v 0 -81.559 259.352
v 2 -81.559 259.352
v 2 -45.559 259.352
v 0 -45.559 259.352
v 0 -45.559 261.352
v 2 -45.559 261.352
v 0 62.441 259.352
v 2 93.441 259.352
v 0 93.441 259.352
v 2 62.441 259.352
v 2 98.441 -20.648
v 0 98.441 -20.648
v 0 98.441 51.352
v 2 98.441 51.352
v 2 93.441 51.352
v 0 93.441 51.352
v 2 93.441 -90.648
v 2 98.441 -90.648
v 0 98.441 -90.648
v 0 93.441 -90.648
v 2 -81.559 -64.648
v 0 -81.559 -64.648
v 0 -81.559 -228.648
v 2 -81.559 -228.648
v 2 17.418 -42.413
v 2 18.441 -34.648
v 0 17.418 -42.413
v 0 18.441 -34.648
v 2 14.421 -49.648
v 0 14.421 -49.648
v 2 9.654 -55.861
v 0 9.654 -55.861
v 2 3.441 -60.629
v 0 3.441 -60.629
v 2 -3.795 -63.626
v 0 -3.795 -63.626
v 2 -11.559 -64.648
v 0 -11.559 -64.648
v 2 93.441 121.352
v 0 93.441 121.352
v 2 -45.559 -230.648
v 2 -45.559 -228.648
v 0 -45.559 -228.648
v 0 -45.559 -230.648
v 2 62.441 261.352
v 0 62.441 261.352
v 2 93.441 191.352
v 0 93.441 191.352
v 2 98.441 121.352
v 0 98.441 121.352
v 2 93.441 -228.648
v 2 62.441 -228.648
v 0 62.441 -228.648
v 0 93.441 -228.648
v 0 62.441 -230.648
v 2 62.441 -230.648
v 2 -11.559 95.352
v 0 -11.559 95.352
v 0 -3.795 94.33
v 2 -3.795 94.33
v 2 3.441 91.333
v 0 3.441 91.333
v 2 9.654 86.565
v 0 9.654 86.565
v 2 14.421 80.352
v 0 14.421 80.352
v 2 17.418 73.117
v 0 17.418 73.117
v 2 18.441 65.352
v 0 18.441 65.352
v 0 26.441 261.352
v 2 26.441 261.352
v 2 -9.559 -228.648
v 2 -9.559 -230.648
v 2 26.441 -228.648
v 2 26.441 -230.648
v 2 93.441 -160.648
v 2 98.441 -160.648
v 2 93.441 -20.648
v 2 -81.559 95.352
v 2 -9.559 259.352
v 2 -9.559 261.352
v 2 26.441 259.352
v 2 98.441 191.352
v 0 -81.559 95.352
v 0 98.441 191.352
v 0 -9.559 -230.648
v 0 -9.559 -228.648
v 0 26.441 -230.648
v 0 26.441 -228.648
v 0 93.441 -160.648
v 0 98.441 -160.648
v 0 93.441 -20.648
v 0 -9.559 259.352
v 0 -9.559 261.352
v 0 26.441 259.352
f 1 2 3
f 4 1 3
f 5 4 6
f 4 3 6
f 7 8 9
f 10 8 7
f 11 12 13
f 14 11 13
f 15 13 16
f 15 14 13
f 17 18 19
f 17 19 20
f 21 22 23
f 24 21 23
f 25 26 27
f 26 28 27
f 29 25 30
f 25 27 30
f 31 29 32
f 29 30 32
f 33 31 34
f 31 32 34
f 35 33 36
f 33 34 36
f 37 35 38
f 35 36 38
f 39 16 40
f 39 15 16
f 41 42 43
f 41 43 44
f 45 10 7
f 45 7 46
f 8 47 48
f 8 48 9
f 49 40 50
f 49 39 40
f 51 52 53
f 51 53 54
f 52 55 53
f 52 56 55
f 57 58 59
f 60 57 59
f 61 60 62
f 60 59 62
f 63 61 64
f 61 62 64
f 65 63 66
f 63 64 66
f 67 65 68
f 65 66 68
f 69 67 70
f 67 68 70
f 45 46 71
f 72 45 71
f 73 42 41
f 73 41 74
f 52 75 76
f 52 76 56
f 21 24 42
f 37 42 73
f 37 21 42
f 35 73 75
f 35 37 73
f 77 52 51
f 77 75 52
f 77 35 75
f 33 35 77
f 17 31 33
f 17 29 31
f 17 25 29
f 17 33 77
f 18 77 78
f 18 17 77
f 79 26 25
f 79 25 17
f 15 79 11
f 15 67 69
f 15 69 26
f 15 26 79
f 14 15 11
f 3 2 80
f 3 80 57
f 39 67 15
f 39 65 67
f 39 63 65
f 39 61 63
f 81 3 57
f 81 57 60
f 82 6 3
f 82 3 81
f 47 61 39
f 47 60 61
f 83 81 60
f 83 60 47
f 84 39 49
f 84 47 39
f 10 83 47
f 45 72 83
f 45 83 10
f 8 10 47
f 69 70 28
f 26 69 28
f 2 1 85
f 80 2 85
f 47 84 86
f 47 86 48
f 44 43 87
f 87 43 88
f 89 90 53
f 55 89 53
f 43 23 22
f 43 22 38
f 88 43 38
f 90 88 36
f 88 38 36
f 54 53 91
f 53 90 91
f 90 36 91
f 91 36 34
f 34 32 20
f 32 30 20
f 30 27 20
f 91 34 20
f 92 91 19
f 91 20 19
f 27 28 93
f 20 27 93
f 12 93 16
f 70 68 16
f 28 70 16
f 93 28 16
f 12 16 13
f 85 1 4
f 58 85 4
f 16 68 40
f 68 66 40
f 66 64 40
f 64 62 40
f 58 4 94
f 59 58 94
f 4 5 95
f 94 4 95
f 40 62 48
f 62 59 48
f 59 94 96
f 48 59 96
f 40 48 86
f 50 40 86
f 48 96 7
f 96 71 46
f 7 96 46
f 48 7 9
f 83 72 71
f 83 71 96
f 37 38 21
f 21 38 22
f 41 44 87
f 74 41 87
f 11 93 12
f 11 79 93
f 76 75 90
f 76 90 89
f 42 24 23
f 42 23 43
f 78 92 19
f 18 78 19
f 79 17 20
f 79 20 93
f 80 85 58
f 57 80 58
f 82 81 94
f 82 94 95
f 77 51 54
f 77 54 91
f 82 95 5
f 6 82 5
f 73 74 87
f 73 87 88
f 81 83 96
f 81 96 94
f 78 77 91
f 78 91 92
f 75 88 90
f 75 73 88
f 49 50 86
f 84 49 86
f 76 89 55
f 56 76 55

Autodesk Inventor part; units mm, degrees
ref_plane "YZ Plane" through (0, 0, 0) normal (1, 0, 0) x (0, 1, 0)
ref_plane "XZ Plane" through (0, 0, 0) normal (0, 1, 0) x (-1, 0, 0)
ref_plane "XY Plane" through (0, 0, 0) normal (0, 0, 1) x (1, 0, 0)
sketch "Sketch1" plane through (0, 0, 0) normal (1, 0, 0) x (0, 1, 0)
  line L0 (98.4407, 261.352) -> (-81.5593, 261.352)
  line L1 (-81.5593, -230.648) -> (98.4407, -230.648)
  line L2 (98.4407, -230.648) -> (98.4407, 261.352)
  line L3 (-81.5593, 95.352) -> (-11.5593, 95.352)
  line L4 (18.4407, 65.352) -> (18.4407, -34.648)
  line L5 (-11.5593, -64.648) -> (-81.5593, -64.648)
  line L6 (-81.5593, 261.352) -> (-81.5593, 95.352)
  line L7 (-81.5593, -64.648) -> (-81.5593, -230.648)
  arc A0 (18.4407, 65.352) -> (-11.5593, 95.352) centre (-11.5593, 65.352) ccw
  arc A1 (-11.5593, -64.648) -> (18.4407, -34.648) centre (-11.5593, -34.648) ccw
  point P0 (0, 0)
  point P1 (18.4407, -64.648)
  point P2 (18.4407, 95.352)
  dimension "d0" = 180
  dimension "d1" = 492
  dimension "d2" = 100
  dimension "d3" = 160
  dimension "d4" = 166
  dimension "d5" = 100
  dimension "d8" = 30
extrude "Extrusion1" add sketch "Sketch1" along normal blind 2
sketch "Sketch2" plane through (2, 0, 0) normal (1, 0, 0) x (0, 0, -1)
  line L0 (-261.352, 98.4407) -> (-191.352, 98.4407)
  line L1 (-191.352, 98.4407) -> (-191.352, 93.4407)
  line L2 (-191.352, 93.4407) -> (-261.352, 93.4407)
  line L3 (-261.352, 93.4407) -> (-261.352, 98.4407)
  line L4 (230.648, 98.4407) -> (-261.352, 98.4407) projected
  line L5 (-121.352, 98.4407) -> (-51.352, 98.4407)
  line L6 (-51.352, 98.4407) -> (-51.352, 93.4407)
  line L7 (-51.352, 93.4407) -> (-121.352, 93.4407)
  line L8 (-121.352, 93.4407) -> (-121.352, 98.4407)
  line L9 (20.648, 98.4407) -> (90.648, 98.4407)
  line L10 (90.648, 98.4407) -> (90.648, 93.4407)
  line L11 (90.648, 93.4407) -> (20.648, 93.4407)
  line L12 (20.648, 93.4407) -> (20.648, 98.4407)
  line L13 (160.648, 98.4407) -> (230.648, 98.4407)
  line L14 (230.648, 98.4407) -> (230.648, 93.4407)
  line L15 (230.648, 93.4407) -> (160.648, 93.4407)
  line L16 (160.648, 93.4407) -> (160.648, 98.4407)
  line L17 (230.648, -81.5593) -> (230.648, 98.4407) projected
  point P0 (0, 0)
  point P1 (230.648, 95.9407)
  point P2 (90.648, 95.9407)
  dimension "d9" = 70
  dimension "d10" = 70
  dimension "d11" = 70
  dimension "d12" = 70
  dimension "d13" = 0
  dimension "d14" = 70
  dimension "d15" = 70
  dimension "d16" = 72
  dimension "d17" = 5
extrude "Extrusion2" cut sketch "Sketch2" against normal blind 2
sketch "Sketch3" plane through (2, 0, 0) normal (1, 0, 0) x (0, 0, -1)
  line L0 (-261.352, 93.4407) -> (-261.352, -81.5593) projected
  line L1 (-261.352, 93.4407) -> (-259.352, 93.4407)
  line L2 (-259.352, 93.4407) -> (-259.352, 62.4407)
  line L3 (-259.352, 62.4407) -> (-261.352, 62.4407)
  line L4 (-261.352, 62.4407) -> (-261.352, 93.4407)
  line L5 (-261.352, 26.4407) -> (-259.352, 26.4407)
  line L6 (-259.352, 26.4407) -> (-259.352, -9.5593)
  line L7 (-259.352, -9.5593) -> (-261.352, -9.5593)
  line L8 (-261.352, -9.5593) -> (-261.352, 26.4407)
  line L9 (-261.352, -81.5593) -> (-259.352, -81.5593)
  line L10 (-259.352, -81.5593) -> (-259.352, -45.5593)
  line L11 (-259.352, -45.5593) -> (-261.352, -45.5593)
  line L12 (-261.352, -45.5593) -> (-261.352, -81.5593)
  line L13 (64.648, -81.5593) -> (230.648, -81.5593) projected
  line L14 (230.648, -81.5593) -> (228.648, -81.5593)
  line L15 (228.648, -81.5593) -> (228.648, -45.5593)
  line L16 (228.648, -45.5593) -> (230.648, -45.5593)
  line L17 (230.648, -45.5593) -> (230.648, -81.5593)
  line L18 (230.648, -81.5593) -> (230.648, 93.4407) projected
  line L19 (230.648, -9.5593) -> (228.648, -9.5593)
  line L20 (228.648, -9.5593) -> (228.648, 26.4407)
  line L21 (228.648, 26.4407) -> (230.648, 26.4407)
  line L22 (230.648, 26.4407) -> (230.648, -9.5593)
  line L23 (160.648, 93.4407) -> (230.648, 93.4407) projected
  line L24 (230.648, 62.4407) -> (228.648, 62.4407)
  line L25 (228.648, 62.4407) -> (228.648, 93.4407)
  line L26 (228.648, 93.4407) -> (230.648, 93.4407)
  line L27 (230.648, 93.4407) -> (230.648, 62.4407)
  point P0 (0, 0)
  point P1 (-260.352, -9.5593)
  point P2 (-260.352, -45.5593)
  point P3 (-260.352, 62.4407)
  point P4 (-260.352, 26.4407)
  point P5 (229.648, 26.4407)
  point P6 (229.648, 62.4407)
  point P7 (229.648, -9.5593)
  point P8 (229.648, -45.5593)
  dimension "d20" = 36
  dimension "d21" = 36
  dimension "d22" = 36
  dimension "d23" = 36
  dimension "d24" = 2
  dimension "d25" = 2
  dimension "d26" = 36
  dimension "d27" = 36
  dimension "d28" = 36
  dimension "d29" = 36
extrude "Extrusion3" cut sketch "Sketch3" against normal blind 2
properties part number "outer_side"
